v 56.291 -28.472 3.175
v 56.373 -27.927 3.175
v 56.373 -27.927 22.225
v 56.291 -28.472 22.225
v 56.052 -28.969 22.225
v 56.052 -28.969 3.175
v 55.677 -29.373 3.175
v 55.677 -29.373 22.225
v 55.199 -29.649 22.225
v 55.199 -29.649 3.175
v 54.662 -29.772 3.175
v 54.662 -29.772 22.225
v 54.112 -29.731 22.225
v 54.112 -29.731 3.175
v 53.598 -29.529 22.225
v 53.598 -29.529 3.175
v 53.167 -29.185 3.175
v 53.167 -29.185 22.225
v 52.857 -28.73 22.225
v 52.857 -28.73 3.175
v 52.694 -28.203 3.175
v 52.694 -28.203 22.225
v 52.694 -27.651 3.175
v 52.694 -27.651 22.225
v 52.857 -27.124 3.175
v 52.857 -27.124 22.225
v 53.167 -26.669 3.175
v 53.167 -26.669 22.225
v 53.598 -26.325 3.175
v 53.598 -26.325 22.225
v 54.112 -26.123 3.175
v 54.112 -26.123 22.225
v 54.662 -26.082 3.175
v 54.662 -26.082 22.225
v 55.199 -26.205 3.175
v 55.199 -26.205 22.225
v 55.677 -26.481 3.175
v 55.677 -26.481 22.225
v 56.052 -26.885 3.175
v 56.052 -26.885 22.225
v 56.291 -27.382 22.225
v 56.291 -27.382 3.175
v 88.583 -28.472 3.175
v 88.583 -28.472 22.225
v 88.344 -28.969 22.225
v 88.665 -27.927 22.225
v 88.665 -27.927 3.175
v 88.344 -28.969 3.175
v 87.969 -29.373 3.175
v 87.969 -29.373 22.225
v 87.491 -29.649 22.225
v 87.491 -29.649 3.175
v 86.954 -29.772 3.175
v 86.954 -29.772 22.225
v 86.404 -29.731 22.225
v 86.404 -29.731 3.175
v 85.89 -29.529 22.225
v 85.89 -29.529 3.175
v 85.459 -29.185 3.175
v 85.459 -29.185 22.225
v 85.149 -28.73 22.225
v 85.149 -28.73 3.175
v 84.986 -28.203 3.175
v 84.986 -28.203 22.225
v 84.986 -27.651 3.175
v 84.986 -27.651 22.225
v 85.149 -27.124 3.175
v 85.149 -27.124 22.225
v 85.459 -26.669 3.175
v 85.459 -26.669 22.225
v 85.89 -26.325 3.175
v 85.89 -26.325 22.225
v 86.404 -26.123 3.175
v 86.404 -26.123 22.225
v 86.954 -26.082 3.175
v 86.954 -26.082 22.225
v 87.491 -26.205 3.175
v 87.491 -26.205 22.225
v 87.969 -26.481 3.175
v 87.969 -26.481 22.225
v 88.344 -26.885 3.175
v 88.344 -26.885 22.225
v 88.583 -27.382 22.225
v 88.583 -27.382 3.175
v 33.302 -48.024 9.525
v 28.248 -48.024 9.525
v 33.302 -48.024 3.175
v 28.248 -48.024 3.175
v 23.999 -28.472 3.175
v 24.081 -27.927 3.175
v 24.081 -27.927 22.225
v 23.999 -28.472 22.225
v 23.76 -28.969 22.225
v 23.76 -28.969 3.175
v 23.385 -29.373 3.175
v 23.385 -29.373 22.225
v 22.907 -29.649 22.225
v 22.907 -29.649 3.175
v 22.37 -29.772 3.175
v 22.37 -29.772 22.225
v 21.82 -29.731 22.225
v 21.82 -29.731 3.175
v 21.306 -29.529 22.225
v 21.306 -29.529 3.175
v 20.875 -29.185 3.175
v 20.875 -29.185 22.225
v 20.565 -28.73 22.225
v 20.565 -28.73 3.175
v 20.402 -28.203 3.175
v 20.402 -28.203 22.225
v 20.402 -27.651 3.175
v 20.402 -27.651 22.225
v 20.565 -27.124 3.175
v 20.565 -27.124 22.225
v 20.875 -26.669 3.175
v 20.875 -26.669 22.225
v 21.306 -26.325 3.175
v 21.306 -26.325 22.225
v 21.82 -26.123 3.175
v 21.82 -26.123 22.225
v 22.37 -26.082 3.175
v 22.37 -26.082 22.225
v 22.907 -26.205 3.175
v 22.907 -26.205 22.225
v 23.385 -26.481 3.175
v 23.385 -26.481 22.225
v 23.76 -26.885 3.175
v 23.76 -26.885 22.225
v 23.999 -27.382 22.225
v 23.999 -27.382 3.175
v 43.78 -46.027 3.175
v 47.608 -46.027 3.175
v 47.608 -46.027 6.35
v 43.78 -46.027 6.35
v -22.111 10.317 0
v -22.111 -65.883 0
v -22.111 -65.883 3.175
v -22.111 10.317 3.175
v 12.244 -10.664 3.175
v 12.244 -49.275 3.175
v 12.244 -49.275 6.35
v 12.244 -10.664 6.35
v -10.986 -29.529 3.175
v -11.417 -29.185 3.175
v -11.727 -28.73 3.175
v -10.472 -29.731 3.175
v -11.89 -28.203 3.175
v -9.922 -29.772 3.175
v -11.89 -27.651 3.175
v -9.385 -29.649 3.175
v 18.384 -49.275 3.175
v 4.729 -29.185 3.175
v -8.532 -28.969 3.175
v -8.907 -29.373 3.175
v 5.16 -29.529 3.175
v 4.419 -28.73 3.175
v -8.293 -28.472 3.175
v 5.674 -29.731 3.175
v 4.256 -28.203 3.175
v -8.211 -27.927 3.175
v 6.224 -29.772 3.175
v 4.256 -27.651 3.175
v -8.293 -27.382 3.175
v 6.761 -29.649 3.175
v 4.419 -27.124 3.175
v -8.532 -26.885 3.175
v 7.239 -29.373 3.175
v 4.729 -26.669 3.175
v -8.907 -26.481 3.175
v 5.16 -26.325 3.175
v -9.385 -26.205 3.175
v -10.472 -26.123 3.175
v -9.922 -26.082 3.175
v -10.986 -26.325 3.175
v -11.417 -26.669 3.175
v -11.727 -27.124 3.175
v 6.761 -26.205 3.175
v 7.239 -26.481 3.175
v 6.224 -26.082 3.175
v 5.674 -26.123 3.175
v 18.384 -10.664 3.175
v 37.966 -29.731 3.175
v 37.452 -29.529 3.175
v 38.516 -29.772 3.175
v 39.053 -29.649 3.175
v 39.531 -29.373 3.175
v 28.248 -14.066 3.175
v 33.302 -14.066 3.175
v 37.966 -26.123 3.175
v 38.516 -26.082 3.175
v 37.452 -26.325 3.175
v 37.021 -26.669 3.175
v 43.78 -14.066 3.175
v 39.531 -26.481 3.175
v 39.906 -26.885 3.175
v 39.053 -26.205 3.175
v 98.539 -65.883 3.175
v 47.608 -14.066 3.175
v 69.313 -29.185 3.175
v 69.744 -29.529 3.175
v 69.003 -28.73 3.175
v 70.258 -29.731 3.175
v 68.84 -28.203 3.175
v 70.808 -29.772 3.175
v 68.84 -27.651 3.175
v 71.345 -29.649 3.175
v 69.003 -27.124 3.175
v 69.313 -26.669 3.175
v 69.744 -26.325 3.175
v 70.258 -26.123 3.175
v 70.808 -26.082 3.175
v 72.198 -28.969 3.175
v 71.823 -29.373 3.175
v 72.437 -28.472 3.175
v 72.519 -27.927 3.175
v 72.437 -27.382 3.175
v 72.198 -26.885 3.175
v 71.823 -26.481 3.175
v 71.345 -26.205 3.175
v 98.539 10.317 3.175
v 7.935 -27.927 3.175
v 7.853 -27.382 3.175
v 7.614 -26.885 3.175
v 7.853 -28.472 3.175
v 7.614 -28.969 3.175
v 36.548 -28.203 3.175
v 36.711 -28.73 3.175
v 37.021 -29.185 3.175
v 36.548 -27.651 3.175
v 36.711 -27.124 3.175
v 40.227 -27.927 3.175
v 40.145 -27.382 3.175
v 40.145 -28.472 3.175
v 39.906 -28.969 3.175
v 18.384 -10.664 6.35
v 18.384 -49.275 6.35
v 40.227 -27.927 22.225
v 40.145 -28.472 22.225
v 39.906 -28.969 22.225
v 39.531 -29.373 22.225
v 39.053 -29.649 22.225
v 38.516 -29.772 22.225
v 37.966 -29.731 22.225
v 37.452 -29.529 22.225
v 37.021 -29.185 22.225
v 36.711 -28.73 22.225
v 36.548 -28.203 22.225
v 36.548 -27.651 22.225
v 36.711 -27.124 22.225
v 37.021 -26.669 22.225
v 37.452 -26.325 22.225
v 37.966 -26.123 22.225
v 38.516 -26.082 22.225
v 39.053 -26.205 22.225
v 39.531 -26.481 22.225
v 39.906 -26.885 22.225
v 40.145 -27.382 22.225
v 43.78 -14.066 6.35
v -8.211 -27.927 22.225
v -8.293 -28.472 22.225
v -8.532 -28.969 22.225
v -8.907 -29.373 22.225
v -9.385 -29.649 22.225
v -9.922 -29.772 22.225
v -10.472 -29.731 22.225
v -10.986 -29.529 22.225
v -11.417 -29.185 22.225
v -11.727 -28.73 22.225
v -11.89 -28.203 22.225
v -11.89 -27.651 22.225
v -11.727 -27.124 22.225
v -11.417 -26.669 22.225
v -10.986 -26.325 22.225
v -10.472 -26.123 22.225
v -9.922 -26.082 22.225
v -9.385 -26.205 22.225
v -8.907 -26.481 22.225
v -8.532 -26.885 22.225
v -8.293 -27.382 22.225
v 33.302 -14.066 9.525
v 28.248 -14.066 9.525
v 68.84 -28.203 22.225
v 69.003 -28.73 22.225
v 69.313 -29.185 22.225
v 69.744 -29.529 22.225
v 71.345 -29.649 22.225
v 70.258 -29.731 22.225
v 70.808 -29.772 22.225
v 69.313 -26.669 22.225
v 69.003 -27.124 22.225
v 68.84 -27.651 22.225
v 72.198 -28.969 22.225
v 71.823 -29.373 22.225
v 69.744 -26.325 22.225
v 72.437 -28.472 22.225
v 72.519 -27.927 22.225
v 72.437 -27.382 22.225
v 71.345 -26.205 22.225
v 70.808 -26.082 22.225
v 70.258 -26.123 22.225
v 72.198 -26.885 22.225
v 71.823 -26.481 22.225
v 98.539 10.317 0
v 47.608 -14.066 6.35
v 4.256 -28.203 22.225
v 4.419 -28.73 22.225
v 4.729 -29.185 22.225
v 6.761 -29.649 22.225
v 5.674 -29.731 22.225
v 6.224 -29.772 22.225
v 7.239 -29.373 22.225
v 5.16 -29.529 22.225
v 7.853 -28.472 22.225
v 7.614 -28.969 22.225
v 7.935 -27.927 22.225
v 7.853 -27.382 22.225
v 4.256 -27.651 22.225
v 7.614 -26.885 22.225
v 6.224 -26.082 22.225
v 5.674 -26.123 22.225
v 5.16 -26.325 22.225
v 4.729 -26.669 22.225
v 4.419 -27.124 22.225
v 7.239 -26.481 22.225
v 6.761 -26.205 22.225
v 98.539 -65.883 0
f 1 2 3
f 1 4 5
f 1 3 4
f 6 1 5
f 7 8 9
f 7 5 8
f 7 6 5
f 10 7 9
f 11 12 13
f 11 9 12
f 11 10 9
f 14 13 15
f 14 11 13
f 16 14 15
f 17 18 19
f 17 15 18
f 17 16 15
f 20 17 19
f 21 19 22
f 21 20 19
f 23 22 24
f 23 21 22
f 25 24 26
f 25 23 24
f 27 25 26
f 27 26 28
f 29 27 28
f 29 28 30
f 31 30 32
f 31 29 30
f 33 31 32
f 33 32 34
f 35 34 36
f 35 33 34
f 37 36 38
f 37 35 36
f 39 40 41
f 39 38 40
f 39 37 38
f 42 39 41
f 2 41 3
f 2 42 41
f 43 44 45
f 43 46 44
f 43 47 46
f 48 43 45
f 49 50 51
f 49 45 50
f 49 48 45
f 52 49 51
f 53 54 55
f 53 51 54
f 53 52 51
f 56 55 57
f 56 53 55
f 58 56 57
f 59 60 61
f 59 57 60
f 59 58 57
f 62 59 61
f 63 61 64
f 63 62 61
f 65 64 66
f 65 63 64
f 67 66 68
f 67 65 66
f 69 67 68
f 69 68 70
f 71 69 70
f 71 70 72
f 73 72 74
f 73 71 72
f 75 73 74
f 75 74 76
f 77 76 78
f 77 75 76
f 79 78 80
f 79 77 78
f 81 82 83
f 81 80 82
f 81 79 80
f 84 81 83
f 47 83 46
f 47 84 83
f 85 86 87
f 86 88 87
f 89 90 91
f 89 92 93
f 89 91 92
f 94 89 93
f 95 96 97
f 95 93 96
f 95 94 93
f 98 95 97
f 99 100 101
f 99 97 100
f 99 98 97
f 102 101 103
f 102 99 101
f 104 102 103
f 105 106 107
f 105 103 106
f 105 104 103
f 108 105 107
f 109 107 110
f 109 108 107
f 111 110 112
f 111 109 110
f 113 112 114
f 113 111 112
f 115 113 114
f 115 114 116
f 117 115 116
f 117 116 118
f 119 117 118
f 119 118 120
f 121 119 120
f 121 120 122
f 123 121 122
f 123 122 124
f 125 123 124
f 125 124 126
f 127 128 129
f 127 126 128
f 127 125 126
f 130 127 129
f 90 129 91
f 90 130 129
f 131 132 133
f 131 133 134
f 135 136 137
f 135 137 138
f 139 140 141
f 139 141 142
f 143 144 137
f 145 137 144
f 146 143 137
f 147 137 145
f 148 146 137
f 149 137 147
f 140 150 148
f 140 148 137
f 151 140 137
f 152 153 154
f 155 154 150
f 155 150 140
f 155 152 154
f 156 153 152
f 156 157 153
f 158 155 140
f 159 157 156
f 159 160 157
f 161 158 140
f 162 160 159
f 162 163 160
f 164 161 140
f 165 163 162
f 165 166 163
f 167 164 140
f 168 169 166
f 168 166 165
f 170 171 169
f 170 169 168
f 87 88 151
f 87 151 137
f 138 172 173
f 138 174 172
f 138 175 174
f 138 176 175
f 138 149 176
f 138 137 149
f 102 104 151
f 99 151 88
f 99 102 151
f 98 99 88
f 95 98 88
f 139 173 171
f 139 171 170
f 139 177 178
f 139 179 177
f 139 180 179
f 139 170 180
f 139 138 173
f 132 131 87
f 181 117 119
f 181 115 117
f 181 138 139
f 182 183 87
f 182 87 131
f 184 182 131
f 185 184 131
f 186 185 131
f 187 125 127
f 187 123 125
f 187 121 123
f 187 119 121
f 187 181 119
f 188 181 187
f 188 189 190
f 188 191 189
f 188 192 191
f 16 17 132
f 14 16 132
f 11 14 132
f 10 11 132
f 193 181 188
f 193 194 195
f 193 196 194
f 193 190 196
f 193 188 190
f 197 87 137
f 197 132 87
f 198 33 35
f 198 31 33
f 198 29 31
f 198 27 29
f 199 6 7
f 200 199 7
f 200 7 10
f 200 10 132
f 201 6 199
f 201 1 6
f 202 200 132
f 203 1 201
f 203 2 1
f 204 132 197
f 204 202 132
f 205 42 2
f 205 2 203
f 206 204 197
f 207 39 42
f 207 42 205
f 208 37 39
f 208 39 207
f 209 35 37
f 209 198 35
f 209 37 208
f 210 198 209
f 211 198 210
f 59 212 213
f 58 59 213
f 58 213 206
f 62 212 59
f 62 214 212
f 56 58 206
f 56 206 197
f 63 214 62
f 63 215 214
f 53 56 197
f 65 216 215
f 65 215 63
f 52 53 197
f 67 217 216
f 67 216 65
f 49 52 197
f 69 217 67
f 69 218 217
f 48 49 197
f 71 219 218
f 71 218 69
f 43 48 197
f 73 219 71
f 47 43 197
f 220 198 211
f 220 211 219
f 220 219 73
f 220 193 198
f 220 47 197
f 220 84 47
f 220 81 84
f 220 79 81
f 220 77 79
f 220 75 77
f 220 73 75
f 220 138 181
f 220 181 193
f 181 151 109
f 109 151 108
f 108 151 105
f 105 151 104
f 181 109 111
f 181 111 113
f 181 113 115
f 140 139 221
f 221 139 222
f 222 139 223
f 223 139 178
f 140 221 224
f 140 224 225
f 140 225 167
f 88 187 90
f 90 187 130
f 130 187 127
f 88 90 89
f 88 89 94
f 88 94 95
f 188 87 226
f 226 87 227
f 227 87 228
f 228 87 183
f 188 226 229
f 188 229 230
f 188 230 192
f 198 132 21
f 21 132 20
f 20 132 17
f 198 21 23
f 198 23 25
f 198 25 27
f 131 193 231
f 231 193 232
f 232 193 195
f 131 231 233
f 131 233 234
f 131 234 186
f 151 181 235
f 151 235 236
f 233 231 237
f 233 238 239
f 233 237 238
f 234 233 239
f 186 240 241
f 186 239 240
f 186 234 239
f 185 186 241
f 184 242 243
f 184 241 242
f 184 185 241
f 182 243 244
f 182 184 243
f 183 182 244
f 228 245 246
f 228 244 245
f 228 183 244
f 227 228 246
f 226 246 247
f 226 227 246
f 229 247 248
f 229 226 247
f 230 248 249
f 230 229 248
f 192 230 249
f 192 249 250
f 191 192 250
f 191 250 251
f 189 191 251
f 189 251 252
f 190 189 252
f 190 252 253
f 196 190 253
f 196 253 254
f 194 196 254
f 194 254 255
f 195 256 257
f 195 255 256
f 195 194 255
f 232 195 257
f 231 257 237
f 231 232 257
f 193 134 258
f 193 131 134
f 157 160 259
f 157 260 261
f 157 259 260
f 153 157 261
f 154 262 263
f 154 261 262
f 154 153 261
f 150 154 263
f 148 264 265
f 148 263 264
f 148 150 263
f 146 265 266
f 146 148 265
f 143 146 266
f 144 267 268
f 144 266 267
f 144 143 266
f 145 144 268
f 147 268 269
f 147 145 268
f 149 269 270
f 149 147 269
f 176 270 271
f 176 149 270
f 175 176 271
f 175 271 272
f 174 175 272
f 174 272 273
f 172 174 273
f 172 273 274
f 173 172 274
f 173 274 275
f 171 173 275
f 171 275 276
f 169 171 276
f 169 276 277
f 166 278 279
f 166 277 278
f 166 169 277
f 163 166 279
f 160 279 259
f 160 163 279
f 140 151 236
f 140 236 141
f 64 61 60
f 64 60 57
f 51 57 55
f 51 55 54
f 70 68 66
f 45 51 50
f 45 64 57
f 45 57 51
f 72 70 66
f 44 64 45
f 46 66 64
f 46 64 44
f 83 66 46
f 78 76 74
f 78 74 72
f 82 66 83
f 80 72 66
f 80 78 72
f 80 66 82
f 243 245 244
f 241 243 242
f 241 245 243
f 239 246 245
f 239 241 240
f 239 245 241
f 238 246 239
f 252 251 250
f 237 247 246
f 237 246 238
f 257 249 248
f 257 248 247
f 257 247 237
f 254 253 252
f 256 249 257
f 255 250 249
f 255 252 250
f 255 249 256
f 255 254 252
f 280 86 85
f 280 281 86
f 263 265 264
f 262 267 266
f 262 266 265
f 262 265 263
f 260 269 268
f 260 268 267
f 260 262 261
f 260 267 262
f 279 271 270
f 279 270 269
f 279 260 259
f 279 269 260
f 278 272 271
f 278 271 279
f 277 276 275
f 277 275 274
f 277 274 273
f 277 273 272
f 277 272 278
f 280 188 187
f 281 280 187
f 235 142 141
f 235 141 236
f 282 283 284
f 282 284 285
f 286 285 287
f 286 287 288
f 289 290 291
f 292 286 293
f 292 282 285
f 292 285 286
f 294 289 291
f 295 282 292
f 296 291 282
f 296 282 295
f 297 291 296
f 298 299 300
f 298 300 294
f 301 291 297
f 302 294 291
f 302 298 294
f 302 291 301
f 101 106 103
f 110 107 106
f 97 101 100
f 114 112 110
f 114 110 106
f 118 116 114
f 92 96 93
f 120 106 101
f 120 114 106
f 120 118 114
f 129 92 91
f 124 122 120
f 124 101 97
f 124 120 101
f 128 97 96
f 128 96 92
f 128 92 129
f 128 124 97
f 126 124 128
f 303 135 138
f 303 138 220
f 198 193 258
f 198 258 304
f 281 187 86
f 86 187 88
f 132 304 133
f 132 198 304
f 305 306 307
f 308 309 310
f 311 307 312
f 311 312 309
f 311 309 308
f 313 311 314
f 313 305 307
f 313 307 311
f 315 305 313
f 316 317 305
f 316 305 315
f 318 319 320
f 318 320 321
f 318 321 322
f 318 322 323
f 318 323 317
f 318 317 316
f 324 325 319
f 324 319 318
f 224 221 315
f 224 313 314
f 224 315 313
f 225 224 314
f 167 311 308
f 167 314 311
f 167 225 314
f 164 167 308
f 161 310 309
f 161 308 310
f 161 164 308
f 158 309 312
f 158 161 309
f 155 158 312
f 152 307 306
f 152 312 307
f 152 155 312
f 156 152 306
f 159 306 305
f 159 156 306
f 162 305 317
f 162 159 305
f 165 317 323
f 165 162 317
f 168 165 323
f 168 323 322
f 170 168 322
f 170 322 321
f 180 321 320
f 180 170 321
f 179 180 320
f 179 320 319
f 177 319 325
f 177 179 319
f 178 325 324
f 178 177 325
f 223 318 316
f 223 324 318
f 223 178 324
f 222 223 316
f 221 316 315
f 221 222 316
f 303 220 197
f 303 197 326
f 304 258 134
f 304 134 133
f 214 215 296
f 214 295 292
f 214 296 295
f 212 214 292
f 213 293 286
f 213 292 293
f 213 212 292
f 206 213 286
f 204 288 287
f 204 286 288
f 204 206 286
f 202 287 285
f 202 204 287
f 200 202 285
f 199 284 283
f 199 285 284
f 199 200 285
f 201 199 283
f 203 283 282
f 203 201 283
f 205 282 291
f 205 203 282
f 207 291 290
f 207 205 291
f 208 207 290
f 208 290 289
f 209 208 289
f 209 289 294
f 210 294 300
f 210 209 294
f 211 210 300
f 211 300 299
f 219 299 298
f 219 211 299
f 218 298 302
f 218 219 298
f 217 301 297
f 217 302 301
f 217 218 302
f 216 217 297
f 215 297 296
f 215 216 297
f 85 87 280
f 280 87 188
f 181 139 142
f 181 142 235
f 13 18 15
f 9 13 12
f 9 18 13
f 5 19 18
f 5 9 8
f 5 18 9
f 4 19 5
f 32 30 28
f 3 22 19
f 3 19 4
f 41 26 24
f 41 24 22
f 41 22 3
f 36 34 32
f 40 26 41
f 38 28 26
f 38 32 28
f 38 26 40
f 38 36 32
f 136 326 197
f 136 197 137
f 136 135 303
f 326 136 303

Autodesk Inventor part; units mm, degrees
ref_plane "YZ Plane" through (0, 0, 0) normal (1, 0, 0) x (0, 1, 0)
ref_plane "XZ Plane" through (0, 0, 0) normal (0, 1, 0) x (-1, 0, 0)
ref_plane "XY Plane" through (0, 0, 0) normal (0, 0, 1) x (1, 0, 0)
sketch "Sketch1" plane through (0, 0, 0) normal (0, 0, 1) x (1, 0, 0)
  line L0 (-22.1112, 10.3171) -> (130.2888, 10.3171)
  line L1 (130.2888, 10.3171) -> (130.2888, -65.8829)
  line L2 (130.2888, -65.8829) -> (-22.1112, -65.8829)
  line L3 (-22.1112, -65.8829) -> (-22.1112, 10.3171)
  point P0 (0, 0)
  dimension "d0" = 152.4
  dimension "d1" = 76.2
extrude "Extrusion1" add sketch "Sketch1" along normal blind 3.175
sketch "Sketch2" plane through (0, 0, 3.175) normal (0, 0, 1) x (1, 0, 0)
  circle A0 centre (-10.0607, -27.9271) radius 1.85
  circle A1 centre (6.0853, -27.9271) radius 1.85
  circle A2 centre (22.2313, -27.9271) radius 1.85
  circle A3 centre (38.3773, -27.9271) radius 1.85
  circle A4 centre (54.5233, -27.9271) radius 1.85
  circle A5 centre (70.6693, -27.9271) radius 1.85
  circle A6 centre (86.8153, -27.9271) radius 1.85
  point P0 (0, 0)
  dimension "d4" = 3.7
  dimension "d5" = 3.7
  dimension "d6" = 3.7
  dimension "d7" = 12.446
  dimension "d8" = 12.446
  dimension "d9" = 3.7
  dimension "d10" = 12.446
  dimension "d11" = 3.7
  dimension "d12" = 3.7
  dimension "d13" = 3.7
  dimension "d14" = 12.446
  dimension "d15" = 12.446
  dimension "d16" = 12.446
extrude "Extrusion2" add sketch "Sketch2" along normal blind 19.05
sketch "Sketch3" plane through (130.2888, -65.8829, 0) normal (1, 0, 0) x (0, 0, -1)
  line L0 (-11.1509, 83.1688) -> (7.2167, 83.1688)
  line L1 (7.2167, 83.1688) -> (7.2167, -5.5026)
  line L2 (7.2167, -5.5026) -> (-11.1509, -5.5026)
  line L3 (-11.1509, -5.5026) -> (-11.1509, 83.1688)
  point P0 (0, 65.8829)
extrude "Extrusion3" cut sketch "Sketch3" against normal blind 31.75
sketch "Sketch4" plane through (0, 0, 3.175) normal (0, 0, 1) x (1, 0, 0)
  line L0 (43.7795, -14.066) -> (47.6081, -14.066)
  line L1 (47.6081, -14.066) -> (47.6081, -46.0267)
  line L2 (47.6081, -46.0267) -> (43.7795, -46.0267)
  line L3 (43.7795, -46.0267) -> (43.7795, -14.066)
  line L4 (33.3021, -14.066) -> (28.2479, -14.066)
  line L5 (28.2479, -14.066) -> (28.2479, -48.0243)
  line L6 (28.2479, -48.0243) -> (33.3021, -48.0243)
  line L7 (33.3021, -48.0243) -> (33.3021, -14.066)
  line L8 (12.2443, -10.6645) -> (18.3845, -10.6645)
  line L9 (18.3845, -10.6645) -> (18.3845, -49.2753)
  line L10 (18.3845, -49.2753) -> (12.2443, -49.2753)
  line L11 (12.2443, -49.2753) -> (12.2443, -10.6645)
  point P0 (0, 0)
extrude "Extrusion4" [suppressed]
extrude "Extrusion5" [suppressed]
extrude "Extrusion6" add sketch "Sketch4" along normal blind 3.175 contours L0 L1 L2 L3 | L8 L9 L10 L11
extrude "Extrusion7" add sketch "Sketch4" along normal blind 6.35 contours L7 L6 L5 L4
properties part number "gearbasephonecaseFINAL"
